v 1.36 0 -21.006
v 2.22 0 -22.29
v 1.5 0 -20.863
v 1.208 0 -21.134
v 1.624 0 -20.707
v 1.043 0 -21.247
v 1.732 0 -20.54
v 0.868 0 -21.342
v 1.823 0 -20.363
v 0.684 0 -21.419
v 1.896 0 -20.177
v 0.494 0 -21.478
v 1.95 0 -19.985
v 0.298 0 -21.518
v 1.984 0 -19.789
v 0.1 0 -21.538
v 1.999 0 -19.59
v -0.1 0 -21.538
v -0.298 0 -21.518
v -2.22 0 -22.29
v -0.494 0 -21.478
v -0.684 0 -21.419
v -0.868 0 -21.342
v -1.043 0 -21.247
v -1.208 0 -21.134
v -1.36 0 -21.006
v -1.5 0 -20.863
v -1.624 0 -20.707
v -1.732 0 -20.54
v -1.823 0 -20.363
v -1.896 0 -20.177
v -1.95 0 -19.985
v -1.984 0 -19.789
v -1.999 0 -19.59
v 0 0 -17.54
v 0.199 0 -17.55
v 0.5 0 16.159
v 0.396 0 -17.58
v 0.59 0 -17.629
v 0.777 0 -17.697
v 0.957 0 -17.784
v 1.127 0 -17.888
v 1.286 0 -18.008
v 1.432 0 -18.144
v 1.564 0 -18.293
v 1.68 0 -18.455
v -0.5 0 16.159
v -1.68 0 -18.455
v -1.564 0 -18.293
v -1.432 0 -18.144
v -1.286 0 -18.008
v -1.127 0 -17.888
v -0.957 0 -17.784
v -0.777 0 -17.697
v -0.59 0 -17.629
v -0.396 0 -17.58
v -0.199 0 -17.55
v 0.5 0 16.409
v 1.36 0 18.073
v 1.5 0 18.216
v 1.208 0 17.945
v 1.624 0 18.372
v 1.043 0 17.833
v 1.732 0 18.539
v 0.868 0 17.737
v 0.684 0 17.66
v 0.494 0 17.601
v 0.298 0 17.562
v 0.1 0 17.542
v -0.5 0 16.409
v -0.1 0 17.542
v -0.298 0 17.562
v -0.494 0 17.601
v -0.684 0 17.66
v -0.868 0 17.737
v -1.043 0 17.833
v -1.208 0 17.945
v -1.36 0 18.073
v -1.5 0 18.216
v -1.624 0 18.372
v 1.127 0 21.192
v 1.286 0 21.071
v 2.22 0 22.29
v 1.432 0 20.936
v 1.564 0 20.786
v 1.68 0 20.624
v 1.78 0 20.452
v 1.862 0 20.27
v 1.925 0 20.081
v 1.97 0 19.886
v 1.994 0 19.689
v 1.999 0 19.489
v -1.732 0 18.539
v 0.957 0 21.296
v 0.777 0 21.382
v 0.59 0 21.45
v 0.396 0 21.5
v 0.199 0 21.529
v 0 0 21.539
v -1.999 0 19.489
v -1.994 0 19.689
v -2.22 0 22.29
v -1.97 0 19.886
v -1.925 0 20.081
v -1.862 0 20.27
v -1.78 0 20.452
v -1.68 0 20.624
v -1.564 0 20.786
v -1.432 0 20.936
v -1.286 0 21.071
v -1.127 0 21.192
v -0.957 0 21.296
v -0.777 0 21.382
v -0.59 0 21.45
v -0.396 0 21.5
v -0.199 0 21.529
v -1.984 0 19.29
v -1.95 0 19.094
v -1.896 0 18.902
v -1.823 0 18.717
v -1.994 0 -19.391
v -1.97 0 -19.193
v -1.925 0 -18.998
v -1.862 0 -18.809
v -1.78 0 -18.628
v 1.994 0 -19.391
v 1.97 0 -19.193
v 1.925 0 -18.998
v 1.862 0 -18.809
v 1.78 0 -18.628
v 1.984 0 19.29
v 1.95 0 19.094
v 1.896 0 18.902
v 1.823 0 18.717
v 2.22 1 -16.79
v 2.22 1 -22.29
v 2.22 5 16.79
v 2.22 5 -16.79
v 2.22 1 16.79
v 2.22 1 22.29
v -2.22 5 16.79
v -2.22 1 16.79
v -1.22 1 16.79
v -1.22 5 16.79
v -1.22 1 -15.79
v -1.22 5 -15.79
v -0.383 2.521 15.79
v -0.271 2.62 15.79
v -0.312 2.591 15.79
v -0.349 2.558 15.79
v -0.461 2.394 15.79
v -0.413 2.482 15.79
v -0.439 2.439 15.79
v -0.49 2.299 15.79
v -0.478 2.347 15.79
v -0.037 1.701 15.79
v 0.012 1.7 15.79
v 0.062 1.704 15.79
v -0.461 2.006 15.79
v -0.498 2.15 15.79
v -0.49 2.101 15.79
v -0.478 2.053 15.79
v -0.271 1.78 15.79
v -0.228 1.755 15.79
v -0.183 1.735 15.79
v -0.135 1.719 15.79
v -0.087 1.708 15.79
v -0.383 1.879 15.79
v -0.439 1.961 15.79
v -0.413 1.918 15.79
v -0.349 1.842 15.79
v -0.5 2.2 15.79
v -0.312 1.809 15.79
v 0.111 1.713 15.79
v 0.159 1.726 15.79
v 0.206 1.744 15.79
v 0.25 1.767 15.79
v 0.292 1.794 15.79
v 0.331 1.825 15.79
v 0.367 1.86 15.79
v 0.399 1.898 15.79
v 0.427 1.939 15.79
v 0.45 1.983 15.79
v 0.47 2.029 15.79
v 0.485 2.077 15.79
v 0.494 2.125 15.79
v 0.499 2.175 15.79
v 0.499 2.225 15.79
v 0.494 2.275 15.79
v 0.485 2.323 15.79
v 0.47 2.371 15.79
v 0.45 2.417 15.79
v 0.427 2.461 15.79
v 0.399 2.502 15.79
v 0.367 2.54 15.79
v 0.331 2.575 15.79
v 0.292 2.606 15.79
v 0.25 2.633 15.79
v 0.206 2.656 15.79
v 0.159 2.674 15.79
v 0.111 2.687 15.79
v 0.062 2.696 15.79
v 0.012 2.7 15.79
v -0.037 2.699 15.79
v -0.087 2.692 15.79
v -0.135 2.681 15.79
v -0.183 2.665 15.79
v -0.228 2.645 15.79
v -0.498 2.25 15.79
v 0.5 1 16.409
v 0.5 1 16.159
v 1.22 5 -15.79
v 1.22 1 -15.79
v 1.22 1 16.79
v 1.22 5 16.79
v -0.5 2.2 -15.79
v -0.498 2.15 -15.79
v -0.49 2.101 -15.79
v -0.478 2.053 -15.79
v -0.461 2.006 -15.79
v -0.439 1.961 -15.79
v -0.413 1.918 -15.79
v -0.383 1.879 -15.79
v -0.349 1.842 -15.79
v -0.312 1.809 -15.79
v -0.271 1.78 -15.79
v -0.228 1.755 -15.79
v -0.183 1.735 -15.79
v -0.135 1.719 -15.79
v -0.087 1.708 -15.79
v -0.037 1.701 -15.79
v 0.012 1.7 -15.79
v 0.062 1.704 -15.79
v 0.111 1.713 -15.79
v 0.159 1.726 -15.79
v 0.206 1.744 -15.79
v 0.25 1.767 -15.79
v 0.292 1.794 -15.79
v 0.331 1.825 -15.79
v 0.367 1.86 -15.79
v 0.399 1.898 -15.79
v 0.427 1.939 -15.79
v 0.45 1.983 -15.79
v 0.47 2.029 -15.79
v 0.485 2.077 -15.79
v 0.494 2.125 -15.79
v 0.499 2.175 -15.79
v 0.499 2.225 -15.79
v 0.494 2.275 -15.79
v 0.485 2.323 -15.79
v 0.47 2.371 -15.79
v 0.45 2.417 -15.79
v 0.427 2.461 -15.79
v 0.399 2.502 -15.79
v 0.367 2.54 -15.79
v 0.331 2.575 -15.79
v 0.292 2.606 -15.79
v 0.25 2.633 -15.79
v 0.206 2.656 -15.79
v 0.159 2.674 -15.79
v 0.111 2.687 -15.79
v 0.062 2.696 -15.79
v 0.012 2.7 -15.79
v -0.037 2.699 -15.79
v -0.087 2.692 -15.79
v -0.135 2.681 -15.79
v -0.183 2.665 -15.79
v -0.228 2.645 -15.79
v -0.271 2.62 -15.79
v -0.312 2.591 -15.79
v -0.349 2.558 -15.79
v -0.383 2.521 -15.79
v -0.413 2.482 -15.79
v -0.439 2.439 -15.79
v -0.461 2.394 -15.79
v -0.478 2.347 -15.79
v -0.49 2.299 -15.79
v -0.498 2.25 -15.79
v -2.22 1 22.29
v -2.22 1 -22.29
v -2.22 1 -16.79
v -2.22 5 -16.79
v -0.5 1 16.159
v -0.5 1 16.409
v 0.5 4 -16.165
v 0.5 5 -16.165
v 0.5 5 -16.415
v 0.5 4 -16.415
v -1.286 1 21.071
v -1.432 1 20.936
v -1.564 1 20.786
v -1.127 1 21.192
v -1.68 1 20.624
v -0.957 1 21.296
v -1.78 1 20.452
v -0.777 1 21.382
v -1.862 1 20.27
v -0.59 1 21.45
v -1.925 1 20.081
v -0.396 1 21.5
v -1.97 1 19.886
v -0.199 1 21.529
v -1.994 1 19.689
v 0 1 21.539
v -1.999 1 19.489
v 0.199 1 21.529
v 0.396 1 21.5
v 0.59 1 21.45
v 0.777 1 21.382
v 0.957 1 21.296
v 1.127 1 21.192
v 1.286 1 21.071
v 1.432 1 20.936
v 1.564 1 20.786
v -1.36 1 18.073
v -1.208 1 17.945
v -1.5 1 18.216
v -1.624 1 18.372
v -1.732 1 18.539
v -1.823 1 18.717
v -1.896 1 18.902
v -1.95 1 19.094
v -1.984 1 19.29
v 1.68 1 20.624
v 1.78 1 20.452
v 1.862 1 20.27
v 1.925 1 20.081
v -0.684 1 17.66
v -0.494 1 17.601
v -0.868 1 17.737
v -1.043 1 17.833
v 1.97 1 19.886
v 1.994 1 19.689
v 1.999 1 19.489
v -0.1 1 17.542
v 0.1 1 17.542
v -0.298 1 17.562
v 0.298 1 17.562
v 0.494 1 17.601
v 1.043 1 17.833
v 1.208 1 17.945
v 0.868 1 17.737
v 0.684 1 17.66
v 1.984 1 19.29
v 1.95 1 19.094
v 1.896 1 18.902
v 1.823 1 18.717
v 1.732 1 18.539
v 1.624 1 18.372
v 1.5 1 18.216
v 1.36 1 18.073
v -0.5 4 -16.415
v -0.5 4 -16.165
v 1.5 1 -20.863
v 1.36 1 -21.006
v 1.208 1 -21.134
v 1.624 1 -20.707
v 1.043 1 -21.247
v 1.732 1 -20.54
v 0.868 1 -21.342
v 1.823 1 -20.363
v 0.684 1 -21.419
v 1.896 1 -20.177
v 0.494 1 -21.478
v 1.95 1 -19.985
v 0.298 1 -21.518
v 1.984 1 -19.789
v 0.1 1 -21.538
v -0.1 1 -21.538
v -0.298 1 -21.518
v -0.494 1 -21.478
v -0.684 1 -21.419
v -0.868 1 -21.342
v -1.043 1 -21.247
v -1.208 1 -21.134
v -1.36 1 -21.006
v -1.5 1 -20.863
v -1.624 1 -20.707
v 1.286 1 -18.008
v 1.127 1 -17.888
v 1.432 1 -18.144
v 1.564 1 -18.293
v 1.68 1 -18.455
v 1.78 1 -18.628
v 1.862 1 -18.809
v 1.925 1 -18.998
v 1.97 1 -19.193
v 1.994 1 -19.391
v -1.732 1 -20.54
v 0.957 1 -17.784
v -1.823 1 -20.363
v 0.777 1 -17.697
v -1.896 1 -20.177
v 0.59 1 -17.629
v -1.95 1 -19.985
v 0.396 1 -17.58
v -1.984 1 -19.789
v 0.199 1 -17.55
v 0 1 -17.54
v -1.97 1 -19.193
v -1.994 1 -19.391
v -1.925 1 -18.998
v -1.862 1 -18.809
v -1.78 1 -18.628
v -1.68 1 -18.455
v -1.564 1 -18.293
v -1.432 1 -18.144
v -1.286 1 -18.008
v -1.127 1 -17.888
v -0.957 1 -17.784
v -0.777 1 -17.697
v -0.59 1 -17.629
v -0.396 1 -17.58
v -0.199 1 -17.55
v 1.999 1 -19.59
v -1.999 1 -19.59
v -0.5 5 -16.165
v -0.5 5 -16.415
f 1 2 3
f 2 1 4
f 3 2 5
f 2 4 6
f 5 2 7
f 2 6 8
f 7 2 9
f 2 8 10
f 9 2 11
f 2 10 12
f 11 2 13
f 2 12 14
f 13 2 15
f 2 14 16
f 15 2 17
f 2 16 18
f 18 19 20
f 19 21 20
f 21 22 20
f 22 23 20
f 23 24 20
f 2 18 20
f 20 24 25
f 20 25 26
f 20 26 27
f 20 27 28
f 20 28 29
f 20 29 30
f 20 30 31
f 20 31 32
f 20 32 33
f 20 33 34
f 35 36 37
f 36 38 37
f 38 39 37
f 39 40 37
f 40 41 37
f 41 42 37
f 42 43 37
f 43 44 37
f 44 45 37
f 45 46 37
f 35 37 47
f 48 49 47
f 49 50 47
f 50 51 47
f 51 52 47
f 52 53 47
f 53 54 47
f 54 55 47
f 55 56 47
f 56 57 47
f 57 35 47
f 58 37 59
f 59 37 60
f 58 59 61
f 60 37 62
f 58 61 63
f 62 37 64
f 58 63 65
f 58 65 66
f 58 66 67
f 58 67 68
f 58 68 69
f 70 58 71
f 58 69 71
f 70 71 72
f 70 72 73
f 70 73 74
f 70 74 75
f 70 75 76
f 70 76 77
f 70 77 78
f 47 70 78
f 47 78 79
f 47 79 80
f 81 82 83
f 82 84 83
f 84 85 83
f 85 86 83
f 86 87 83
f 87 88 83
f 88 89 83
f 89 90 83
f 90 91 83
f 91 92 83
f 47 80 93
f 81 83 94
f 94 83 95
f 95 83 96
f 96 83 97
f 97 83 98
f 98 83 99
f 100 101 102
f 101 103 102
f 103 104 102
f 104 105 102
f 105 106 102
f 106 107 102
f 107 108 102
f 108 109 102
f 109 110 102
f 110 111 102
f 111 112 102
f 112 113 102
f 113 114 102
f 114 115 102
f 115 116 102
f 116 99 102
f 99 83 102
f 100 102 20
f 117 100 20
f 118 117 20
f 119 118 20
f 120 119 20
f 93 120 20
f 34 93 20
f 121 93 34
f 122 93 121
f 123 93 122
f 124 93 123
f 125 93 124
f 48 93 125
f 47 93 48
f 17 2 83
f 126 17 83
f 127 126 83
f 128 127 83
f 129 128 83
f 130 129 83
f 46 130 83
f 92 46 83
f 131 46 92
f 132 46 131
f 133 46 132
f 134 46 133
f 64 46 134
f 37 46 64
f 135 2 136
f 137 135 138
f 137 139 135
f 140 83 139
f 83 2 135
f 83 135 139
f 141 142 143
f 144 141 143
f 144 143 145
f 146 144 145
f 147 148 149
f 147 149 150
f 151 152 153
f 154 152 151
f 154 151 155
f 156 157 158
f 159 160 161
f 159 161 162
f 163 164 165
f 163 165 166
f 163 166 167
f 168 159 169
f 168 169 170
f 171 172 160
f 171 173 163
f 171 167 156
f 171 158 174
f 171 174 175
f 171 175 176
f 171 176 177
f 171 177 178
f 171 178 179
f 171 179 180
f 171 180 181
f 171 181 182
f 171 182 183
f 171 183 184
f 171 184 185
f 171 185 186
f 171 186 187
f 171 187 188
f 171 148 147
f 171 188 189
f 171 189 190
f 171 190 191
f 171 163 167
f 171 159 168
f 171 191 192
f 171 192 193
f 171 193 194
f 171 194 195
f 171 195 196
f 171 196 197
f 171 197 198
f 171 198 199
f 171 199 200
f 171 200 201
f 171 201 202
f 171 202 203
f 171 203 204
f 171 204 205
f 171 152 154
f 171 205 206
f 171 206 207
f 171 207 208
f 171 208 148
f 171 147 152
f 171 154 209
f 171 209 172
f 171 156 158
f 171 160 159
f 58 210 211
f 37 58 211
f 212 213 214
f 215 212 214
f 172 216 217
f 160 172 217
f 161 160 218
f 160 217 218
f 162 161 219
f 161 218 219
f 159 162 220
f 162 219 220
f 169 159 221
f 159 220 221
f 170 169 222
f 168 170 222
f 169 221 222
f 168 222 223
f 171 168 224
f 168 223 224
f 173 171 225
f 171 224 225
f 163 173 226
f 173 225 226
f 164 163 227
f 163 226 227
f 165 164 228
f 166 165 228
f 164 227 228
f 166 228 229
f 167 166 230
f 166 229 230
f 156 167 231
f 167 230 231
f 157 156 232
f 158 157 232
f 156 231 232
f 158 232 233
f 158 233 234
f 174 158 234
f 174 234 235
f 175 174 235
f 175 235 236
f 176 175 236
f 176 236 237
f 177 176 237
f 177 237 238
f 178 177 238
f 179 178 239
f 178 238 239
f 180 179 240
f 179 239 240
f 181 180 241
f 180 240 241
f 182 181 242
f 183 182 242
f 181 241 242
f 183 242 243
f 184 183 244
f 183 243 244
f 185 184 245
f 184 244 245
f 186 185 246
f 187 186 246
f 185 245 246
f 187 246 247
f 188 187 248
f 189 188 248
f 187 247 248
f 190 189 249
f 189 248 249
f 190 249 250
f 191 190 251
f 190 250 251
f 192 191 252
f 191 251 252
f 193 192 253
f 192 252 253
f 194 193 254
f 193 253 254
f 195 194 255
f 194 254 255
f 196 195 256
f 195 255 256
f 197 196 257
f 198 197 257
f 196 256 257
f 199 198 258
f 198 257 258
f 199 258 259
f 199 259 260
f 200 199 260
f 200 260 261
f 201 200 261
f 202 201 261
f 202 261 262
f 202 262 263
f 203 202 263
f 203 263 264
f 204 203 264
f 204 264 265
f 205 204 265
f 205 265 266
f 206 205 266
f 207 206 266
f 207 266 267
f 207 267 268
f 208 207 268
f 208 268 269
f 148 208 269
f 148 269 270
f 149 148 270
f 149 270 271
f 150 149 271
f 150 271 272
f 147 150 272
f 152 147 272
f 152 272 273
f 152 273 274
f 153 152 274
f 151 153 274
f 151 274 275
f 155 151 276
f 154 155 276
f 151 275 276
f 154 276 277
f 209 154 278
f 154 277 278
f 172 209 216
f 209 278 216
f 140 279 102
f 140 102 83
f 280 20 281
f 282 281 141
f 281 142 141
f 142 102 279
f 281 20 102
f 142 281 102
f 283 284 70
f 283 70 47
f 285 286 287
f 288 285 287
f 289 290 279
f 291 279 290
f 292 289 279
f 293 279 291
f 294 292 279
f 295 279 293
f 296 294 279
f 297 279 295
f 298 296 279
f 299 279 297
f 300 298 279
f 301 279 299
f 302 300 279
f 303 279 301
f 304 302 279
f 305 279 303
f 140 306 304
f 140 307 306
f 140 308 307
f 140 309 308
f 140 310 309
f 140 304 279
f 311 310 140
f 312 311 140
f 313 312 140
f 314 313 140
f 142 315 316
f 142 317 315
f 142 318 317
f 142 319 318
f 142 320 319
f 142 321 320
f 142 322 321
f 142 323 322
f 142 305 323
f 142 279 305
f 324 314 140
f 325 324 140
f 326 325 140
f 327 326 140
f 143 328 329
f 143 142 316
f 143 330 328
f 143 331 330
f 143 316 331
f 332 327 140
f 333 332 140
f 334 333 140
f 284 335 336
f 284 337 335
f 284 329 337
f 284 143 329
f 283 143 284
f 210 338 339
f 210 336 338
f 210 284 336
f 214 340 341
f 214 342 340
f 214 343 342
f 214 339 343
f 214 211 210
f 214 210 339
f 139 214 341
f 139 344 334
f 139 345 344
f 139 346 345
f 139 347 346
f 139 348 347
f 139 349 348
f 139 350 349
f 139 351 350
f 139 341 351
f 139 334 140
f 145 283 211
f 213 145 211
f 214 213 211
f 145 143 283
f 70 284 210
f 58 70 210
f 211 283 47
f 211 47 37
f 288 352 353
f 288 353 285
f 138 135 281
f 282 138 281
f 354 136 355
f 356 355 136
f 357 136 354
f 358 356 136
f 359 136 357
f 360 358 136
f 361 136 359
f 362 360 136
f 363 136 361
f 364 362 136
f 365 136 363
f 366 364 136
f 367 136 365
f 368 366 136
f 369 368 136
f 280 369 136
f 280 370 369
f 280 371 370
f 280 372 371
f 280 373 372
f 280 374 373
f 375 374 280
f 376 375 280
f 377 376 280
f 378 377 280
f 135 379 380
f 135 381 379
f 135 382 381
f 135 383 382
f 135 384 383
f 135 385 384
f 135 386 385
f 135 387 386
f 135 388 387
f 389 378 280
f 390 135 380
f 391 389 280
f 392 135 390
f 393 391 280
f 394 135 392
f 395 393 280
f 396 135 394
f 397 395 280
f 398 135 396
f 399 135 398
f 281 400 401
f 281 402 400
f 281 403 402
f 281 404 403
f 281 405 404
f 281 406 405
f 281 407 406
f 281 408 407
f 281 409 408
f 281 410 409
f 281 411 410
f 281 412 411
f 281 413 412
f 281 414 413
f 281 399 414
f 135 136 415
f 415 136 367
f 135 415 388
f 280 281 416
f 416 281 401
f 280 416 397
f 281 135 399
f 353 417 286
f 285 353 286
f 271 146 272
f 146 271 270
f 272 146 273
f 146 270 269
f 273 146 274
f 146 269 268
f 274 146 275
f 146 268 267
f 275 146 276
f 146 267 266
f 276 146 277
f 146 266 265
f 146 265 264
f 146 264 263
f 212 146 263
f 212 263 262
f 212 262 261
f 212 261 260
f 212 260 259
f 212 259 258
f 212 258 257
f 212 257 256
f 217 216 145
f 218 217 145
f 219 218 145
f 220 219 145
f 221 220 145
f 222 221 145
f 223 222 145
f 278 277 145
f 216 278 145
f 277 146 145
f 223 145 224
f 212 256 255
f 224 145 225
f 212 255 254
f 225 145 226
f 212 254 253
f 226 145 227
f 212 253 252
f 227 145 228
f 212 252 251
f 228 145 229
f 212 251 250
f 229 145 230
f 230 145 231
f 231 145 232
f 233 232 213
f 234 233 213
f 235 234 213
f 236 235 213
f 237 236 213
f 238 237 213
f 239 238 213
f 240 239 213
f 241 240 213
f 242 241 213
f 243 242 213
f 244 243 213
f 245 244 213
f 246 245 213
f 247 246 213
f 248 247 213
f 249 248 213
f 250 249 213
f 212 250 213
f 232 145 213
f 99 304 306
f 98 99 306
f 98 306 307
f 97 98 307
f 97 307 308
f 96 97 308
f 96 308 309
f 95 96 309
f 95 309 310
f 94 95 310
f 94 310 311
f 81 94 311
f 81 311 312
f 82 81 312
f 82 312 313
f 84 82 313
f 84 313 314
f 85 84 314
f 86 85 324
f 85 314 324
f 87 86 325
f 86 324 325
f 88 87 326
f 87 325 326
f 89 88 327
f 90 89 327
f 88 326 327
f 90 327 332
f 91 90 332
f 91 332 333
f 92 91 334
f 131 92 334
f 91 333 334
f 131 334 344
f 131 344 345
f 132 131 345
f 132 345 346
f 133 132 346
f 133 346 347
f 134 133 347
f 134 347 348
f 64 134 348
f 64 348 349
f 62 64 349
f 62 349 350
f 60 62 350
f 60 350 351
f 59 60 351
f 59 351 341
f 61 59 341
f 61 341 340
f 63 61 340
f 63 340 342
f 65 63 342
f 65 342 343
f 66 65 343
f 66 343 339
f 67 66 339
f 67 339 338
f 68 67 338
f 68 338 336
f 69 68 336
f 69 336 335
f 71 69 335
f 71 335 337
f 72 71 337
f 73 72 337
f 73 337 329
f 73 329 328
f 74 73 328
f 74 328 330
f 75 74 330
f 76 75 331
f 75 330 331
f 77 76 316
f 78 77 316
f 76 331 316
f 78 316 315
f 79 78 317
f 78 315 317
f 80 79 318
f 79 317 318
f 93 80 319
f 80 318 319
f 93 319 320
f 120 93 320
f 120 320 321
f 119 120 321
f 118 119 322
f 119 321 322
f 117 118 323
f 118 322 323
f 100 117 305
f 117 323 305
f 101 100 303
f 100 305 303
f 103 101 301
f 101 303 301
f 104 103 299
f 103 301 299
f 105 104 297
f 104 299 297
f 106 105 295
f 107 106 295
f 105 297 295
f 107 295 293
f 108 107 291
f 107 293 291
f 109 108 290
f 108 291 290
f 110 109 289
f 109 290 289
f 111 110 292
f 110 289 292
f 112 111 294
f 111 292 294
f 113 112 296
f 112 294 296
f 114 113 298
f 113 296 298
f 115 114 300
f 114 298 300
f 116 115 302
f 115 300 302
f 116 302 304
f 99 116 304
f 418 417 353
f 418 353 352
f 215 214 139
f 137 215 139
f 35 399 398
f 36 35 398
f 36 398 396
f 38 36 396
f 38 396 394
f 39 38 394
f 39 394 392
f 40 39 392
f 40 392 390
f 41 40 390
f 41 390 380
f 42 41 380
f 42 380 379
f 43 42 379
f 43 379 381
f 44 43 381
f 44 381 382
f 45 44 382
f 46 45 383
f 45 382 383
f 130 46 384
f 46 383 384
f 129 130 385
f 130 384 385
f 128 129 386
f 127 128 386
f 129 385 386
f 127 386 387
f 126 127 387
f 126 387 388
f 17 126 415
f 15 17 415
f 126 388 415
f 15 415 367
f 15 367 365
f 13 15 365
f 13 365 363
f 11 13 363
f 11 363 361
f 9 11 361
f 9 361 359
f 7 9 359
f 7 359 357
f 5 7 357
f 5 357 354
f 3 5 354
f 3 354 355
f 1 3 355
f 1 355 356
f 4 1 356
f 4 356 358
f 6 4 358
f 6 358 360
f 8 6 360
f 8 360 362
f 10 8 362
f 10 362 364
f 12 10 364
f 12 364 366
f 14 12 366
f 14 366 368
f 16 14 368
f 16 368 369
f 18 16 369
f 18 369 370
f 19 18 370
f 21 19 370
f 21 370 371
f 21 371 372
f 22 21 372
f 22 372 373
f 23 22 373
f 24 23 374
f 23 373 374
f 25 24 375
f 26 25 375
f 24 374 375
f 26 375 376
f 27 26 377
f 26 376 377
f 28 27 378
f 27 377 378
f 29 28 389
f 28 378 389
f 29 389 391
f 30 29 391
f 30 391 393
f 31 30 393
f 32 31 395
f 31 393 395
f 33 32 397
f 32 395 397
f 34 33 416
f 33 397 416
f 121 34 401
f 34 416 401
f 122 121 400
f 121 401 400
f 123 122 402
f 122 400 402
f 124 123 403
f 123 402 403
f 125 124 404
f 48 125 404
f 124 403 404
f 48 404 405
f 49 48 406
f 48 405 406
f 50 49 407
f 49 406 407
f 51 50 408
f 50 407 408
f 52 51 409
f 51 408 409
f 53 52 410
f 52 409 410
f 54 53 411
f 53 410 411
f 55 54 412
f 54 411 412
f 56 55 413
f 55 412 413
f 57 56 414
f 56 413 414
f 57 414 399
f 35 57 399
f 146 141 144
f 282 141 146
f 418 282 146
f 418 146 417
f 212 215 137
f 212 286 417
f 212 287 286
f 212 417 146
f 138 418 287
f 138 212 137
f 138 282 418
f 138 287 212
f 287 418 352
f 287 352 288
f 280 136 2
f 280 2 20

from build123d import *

# Parameters (mm, degrees)
SZKIC1_W                    = 4.44
SZKIC1_H                    = 33.58
DODANIE_WYCI_GNI_CIE1_DEPTH = 1
DODANIE_WYCI_GNI_CIE2_DEPTH = 4
SZKIC3_R                    = 0.5
DODANIE_WYCI_GNI_CIE3_DEPTH = 31.58
SZKIC4_W                    = 1
SZKIC4_H                    = 0.25
WYTNIJ_WYCI_GNI_CIE1_DEPTH  = 31.58
SZKIC5_W                    = 1
SZKIC5_H                    = 0.25
WYTNIJ_WYCI_GNI_CIE2_DEPTH  = 1
SZKIC6_W                    = 4.44
SZKIC6_H                    = 1
DODANIE_WYCI_GNI_CIE5_DEPTH = 5.5
SZKIC8_R                    = 2
WYTNIJ_WYCI_GNI_CIE3_DEPTH  = 5.5
SZKIC9_W                    = 4.44
SZKIC9_H                    = 1
DODANIE_WYCI_GNI_CIE6_DEPTH = 5.5
SZKIC11_R                   = 2
WYTNIJ_WYCI_GNI_CIE4_DEPTH  = 5.5


with BuildPart() as part:
    # Szkic1 → Dodanie-wyciągnięcie1 (new body)
    with BuildSketch(Plane(origin=(0, 0, 0), x_dir=(1, 0, 0), z_dir=(0, 1, 0))):
        Rectangle(SZKIC1_W, SZKIC1_H)
    extrude(amount=DODANIE_WYCI_GNI_CIE1_DEPTH)

    # Szkic2 → Dodanie-wyciągnięcie2 (add)
    with BuildSketch(Plane(origin=(0, 1, 0), x_dir=(1, 0, 0), z_dir=(0, 1, 0))):
        Polygon((-2.22, 16.79), (-2.22, -16.79), (-1.22, -16.79), (-1.22, 15.79), (1.22, 15.79), (1.22, -16.79), (2.22, -16.79), (2.22, 16.79), align=None)
    extrude(amount=DODANIE_WYCI_GNI_CIE2_DEPTH)

    # Szkic3 → Dodanie-wyciągnięcie3 (add)
    with BuildSketch(Plane.XY.offset(-15.79)):
        with Locations(Location((0, 2.2, 0), (0, 0, 180))):
            Circle(SZKIC3_R)
    extrude(amount=DODANIE_WYCI_GNI_CIE3_DEPTH)

    # Szkic4 → Wytnij-wyciągnięcie1 (cut)
    with BuildSketch(Plane(origin=(0, 1, 0), x_dir=(1, 0, 0), z_dir=(0, 1, 0))):
        with Locations((0, -16.283529096)):
            Rectangle(SZKIC4_W, SZKIC4_H)
    extrude(amount=-WYTNIJ_WYCI_GNI_CIE1_DEPTH, mode=Mode.SUBTRACT)

    # Szkic5 → Wytnij-wyciągnięcie2 (cut)
    with BuildSketch(Plane(origin=(0, 5, 0), x_dir=(1, 0, 0), z_dir=(0, 1, 0))):
        with Locations((0, 16.29)):
            Rectangle(SZKIC5_W, SZKIC5_H)
    extrude(amount=-WYTNIJ_WYCI_GNI_CIE2_DEPTH, mode=Mode.SUBTRACT)

    # Szkic6 → Dodanie-wyciągnięcie5 (add)
    with BuildSketch(Plane.XY.offset(16.79)):
        with Locations((0, 0.5)):
            Rectangle(SZKIC6_W, SZKIC6_H)
    extrude(amount=DODANIE_WYCI_GNI_CIE5_DEPTH)

    # Szkic8 → Wytnij-wyciągnięcie3 (cut)
    with BuildSketch(Plane(origin=(0, 1, 0), x_dir=(1, 0, 0), z_dir=(0, 1, 0))):
        with Locations(Location((0, -19.539171246, 0), (0, 0, 270))):
            Circle(SZKIC8_R)
    extrude(amount=-WYTNIJ_WYCI_GNI_CIE3_DEPTH, mode=Mode.SUBTRACT)

    # Szkic9 → Dodanie-wyciągnięcie6 (add)
    with BuildSketch(Plane(origin=(0, 0, -16.79), x_dir=(-1, 0, 0), z_dir=(0, 0, -1))):
        with Locations((0, 0.5)):
            Rectangle(SZKIC9_W, SZKIC9_H)
    extrude(amount=DODANIE_WYCI_GNI_CIE6_DEPTH)

    # Szkic11 → Wytnij-wyciągnięcie4 (cut)
    with BuildSketch(Plane(origin=(0, 1, 0), x_dir=(1, 0, 0), z_dir=(0, 1, 0))):
        with Locations(Location((0, 19.54, 0), (0, 0, 270))):
            Circle(SZKIC11_R)
    extrude(amount=-WYTNIJ_WYCI_GNI_CIE4_DEPTH, mode=Mode.SUBTRACT)


solid = part.part
